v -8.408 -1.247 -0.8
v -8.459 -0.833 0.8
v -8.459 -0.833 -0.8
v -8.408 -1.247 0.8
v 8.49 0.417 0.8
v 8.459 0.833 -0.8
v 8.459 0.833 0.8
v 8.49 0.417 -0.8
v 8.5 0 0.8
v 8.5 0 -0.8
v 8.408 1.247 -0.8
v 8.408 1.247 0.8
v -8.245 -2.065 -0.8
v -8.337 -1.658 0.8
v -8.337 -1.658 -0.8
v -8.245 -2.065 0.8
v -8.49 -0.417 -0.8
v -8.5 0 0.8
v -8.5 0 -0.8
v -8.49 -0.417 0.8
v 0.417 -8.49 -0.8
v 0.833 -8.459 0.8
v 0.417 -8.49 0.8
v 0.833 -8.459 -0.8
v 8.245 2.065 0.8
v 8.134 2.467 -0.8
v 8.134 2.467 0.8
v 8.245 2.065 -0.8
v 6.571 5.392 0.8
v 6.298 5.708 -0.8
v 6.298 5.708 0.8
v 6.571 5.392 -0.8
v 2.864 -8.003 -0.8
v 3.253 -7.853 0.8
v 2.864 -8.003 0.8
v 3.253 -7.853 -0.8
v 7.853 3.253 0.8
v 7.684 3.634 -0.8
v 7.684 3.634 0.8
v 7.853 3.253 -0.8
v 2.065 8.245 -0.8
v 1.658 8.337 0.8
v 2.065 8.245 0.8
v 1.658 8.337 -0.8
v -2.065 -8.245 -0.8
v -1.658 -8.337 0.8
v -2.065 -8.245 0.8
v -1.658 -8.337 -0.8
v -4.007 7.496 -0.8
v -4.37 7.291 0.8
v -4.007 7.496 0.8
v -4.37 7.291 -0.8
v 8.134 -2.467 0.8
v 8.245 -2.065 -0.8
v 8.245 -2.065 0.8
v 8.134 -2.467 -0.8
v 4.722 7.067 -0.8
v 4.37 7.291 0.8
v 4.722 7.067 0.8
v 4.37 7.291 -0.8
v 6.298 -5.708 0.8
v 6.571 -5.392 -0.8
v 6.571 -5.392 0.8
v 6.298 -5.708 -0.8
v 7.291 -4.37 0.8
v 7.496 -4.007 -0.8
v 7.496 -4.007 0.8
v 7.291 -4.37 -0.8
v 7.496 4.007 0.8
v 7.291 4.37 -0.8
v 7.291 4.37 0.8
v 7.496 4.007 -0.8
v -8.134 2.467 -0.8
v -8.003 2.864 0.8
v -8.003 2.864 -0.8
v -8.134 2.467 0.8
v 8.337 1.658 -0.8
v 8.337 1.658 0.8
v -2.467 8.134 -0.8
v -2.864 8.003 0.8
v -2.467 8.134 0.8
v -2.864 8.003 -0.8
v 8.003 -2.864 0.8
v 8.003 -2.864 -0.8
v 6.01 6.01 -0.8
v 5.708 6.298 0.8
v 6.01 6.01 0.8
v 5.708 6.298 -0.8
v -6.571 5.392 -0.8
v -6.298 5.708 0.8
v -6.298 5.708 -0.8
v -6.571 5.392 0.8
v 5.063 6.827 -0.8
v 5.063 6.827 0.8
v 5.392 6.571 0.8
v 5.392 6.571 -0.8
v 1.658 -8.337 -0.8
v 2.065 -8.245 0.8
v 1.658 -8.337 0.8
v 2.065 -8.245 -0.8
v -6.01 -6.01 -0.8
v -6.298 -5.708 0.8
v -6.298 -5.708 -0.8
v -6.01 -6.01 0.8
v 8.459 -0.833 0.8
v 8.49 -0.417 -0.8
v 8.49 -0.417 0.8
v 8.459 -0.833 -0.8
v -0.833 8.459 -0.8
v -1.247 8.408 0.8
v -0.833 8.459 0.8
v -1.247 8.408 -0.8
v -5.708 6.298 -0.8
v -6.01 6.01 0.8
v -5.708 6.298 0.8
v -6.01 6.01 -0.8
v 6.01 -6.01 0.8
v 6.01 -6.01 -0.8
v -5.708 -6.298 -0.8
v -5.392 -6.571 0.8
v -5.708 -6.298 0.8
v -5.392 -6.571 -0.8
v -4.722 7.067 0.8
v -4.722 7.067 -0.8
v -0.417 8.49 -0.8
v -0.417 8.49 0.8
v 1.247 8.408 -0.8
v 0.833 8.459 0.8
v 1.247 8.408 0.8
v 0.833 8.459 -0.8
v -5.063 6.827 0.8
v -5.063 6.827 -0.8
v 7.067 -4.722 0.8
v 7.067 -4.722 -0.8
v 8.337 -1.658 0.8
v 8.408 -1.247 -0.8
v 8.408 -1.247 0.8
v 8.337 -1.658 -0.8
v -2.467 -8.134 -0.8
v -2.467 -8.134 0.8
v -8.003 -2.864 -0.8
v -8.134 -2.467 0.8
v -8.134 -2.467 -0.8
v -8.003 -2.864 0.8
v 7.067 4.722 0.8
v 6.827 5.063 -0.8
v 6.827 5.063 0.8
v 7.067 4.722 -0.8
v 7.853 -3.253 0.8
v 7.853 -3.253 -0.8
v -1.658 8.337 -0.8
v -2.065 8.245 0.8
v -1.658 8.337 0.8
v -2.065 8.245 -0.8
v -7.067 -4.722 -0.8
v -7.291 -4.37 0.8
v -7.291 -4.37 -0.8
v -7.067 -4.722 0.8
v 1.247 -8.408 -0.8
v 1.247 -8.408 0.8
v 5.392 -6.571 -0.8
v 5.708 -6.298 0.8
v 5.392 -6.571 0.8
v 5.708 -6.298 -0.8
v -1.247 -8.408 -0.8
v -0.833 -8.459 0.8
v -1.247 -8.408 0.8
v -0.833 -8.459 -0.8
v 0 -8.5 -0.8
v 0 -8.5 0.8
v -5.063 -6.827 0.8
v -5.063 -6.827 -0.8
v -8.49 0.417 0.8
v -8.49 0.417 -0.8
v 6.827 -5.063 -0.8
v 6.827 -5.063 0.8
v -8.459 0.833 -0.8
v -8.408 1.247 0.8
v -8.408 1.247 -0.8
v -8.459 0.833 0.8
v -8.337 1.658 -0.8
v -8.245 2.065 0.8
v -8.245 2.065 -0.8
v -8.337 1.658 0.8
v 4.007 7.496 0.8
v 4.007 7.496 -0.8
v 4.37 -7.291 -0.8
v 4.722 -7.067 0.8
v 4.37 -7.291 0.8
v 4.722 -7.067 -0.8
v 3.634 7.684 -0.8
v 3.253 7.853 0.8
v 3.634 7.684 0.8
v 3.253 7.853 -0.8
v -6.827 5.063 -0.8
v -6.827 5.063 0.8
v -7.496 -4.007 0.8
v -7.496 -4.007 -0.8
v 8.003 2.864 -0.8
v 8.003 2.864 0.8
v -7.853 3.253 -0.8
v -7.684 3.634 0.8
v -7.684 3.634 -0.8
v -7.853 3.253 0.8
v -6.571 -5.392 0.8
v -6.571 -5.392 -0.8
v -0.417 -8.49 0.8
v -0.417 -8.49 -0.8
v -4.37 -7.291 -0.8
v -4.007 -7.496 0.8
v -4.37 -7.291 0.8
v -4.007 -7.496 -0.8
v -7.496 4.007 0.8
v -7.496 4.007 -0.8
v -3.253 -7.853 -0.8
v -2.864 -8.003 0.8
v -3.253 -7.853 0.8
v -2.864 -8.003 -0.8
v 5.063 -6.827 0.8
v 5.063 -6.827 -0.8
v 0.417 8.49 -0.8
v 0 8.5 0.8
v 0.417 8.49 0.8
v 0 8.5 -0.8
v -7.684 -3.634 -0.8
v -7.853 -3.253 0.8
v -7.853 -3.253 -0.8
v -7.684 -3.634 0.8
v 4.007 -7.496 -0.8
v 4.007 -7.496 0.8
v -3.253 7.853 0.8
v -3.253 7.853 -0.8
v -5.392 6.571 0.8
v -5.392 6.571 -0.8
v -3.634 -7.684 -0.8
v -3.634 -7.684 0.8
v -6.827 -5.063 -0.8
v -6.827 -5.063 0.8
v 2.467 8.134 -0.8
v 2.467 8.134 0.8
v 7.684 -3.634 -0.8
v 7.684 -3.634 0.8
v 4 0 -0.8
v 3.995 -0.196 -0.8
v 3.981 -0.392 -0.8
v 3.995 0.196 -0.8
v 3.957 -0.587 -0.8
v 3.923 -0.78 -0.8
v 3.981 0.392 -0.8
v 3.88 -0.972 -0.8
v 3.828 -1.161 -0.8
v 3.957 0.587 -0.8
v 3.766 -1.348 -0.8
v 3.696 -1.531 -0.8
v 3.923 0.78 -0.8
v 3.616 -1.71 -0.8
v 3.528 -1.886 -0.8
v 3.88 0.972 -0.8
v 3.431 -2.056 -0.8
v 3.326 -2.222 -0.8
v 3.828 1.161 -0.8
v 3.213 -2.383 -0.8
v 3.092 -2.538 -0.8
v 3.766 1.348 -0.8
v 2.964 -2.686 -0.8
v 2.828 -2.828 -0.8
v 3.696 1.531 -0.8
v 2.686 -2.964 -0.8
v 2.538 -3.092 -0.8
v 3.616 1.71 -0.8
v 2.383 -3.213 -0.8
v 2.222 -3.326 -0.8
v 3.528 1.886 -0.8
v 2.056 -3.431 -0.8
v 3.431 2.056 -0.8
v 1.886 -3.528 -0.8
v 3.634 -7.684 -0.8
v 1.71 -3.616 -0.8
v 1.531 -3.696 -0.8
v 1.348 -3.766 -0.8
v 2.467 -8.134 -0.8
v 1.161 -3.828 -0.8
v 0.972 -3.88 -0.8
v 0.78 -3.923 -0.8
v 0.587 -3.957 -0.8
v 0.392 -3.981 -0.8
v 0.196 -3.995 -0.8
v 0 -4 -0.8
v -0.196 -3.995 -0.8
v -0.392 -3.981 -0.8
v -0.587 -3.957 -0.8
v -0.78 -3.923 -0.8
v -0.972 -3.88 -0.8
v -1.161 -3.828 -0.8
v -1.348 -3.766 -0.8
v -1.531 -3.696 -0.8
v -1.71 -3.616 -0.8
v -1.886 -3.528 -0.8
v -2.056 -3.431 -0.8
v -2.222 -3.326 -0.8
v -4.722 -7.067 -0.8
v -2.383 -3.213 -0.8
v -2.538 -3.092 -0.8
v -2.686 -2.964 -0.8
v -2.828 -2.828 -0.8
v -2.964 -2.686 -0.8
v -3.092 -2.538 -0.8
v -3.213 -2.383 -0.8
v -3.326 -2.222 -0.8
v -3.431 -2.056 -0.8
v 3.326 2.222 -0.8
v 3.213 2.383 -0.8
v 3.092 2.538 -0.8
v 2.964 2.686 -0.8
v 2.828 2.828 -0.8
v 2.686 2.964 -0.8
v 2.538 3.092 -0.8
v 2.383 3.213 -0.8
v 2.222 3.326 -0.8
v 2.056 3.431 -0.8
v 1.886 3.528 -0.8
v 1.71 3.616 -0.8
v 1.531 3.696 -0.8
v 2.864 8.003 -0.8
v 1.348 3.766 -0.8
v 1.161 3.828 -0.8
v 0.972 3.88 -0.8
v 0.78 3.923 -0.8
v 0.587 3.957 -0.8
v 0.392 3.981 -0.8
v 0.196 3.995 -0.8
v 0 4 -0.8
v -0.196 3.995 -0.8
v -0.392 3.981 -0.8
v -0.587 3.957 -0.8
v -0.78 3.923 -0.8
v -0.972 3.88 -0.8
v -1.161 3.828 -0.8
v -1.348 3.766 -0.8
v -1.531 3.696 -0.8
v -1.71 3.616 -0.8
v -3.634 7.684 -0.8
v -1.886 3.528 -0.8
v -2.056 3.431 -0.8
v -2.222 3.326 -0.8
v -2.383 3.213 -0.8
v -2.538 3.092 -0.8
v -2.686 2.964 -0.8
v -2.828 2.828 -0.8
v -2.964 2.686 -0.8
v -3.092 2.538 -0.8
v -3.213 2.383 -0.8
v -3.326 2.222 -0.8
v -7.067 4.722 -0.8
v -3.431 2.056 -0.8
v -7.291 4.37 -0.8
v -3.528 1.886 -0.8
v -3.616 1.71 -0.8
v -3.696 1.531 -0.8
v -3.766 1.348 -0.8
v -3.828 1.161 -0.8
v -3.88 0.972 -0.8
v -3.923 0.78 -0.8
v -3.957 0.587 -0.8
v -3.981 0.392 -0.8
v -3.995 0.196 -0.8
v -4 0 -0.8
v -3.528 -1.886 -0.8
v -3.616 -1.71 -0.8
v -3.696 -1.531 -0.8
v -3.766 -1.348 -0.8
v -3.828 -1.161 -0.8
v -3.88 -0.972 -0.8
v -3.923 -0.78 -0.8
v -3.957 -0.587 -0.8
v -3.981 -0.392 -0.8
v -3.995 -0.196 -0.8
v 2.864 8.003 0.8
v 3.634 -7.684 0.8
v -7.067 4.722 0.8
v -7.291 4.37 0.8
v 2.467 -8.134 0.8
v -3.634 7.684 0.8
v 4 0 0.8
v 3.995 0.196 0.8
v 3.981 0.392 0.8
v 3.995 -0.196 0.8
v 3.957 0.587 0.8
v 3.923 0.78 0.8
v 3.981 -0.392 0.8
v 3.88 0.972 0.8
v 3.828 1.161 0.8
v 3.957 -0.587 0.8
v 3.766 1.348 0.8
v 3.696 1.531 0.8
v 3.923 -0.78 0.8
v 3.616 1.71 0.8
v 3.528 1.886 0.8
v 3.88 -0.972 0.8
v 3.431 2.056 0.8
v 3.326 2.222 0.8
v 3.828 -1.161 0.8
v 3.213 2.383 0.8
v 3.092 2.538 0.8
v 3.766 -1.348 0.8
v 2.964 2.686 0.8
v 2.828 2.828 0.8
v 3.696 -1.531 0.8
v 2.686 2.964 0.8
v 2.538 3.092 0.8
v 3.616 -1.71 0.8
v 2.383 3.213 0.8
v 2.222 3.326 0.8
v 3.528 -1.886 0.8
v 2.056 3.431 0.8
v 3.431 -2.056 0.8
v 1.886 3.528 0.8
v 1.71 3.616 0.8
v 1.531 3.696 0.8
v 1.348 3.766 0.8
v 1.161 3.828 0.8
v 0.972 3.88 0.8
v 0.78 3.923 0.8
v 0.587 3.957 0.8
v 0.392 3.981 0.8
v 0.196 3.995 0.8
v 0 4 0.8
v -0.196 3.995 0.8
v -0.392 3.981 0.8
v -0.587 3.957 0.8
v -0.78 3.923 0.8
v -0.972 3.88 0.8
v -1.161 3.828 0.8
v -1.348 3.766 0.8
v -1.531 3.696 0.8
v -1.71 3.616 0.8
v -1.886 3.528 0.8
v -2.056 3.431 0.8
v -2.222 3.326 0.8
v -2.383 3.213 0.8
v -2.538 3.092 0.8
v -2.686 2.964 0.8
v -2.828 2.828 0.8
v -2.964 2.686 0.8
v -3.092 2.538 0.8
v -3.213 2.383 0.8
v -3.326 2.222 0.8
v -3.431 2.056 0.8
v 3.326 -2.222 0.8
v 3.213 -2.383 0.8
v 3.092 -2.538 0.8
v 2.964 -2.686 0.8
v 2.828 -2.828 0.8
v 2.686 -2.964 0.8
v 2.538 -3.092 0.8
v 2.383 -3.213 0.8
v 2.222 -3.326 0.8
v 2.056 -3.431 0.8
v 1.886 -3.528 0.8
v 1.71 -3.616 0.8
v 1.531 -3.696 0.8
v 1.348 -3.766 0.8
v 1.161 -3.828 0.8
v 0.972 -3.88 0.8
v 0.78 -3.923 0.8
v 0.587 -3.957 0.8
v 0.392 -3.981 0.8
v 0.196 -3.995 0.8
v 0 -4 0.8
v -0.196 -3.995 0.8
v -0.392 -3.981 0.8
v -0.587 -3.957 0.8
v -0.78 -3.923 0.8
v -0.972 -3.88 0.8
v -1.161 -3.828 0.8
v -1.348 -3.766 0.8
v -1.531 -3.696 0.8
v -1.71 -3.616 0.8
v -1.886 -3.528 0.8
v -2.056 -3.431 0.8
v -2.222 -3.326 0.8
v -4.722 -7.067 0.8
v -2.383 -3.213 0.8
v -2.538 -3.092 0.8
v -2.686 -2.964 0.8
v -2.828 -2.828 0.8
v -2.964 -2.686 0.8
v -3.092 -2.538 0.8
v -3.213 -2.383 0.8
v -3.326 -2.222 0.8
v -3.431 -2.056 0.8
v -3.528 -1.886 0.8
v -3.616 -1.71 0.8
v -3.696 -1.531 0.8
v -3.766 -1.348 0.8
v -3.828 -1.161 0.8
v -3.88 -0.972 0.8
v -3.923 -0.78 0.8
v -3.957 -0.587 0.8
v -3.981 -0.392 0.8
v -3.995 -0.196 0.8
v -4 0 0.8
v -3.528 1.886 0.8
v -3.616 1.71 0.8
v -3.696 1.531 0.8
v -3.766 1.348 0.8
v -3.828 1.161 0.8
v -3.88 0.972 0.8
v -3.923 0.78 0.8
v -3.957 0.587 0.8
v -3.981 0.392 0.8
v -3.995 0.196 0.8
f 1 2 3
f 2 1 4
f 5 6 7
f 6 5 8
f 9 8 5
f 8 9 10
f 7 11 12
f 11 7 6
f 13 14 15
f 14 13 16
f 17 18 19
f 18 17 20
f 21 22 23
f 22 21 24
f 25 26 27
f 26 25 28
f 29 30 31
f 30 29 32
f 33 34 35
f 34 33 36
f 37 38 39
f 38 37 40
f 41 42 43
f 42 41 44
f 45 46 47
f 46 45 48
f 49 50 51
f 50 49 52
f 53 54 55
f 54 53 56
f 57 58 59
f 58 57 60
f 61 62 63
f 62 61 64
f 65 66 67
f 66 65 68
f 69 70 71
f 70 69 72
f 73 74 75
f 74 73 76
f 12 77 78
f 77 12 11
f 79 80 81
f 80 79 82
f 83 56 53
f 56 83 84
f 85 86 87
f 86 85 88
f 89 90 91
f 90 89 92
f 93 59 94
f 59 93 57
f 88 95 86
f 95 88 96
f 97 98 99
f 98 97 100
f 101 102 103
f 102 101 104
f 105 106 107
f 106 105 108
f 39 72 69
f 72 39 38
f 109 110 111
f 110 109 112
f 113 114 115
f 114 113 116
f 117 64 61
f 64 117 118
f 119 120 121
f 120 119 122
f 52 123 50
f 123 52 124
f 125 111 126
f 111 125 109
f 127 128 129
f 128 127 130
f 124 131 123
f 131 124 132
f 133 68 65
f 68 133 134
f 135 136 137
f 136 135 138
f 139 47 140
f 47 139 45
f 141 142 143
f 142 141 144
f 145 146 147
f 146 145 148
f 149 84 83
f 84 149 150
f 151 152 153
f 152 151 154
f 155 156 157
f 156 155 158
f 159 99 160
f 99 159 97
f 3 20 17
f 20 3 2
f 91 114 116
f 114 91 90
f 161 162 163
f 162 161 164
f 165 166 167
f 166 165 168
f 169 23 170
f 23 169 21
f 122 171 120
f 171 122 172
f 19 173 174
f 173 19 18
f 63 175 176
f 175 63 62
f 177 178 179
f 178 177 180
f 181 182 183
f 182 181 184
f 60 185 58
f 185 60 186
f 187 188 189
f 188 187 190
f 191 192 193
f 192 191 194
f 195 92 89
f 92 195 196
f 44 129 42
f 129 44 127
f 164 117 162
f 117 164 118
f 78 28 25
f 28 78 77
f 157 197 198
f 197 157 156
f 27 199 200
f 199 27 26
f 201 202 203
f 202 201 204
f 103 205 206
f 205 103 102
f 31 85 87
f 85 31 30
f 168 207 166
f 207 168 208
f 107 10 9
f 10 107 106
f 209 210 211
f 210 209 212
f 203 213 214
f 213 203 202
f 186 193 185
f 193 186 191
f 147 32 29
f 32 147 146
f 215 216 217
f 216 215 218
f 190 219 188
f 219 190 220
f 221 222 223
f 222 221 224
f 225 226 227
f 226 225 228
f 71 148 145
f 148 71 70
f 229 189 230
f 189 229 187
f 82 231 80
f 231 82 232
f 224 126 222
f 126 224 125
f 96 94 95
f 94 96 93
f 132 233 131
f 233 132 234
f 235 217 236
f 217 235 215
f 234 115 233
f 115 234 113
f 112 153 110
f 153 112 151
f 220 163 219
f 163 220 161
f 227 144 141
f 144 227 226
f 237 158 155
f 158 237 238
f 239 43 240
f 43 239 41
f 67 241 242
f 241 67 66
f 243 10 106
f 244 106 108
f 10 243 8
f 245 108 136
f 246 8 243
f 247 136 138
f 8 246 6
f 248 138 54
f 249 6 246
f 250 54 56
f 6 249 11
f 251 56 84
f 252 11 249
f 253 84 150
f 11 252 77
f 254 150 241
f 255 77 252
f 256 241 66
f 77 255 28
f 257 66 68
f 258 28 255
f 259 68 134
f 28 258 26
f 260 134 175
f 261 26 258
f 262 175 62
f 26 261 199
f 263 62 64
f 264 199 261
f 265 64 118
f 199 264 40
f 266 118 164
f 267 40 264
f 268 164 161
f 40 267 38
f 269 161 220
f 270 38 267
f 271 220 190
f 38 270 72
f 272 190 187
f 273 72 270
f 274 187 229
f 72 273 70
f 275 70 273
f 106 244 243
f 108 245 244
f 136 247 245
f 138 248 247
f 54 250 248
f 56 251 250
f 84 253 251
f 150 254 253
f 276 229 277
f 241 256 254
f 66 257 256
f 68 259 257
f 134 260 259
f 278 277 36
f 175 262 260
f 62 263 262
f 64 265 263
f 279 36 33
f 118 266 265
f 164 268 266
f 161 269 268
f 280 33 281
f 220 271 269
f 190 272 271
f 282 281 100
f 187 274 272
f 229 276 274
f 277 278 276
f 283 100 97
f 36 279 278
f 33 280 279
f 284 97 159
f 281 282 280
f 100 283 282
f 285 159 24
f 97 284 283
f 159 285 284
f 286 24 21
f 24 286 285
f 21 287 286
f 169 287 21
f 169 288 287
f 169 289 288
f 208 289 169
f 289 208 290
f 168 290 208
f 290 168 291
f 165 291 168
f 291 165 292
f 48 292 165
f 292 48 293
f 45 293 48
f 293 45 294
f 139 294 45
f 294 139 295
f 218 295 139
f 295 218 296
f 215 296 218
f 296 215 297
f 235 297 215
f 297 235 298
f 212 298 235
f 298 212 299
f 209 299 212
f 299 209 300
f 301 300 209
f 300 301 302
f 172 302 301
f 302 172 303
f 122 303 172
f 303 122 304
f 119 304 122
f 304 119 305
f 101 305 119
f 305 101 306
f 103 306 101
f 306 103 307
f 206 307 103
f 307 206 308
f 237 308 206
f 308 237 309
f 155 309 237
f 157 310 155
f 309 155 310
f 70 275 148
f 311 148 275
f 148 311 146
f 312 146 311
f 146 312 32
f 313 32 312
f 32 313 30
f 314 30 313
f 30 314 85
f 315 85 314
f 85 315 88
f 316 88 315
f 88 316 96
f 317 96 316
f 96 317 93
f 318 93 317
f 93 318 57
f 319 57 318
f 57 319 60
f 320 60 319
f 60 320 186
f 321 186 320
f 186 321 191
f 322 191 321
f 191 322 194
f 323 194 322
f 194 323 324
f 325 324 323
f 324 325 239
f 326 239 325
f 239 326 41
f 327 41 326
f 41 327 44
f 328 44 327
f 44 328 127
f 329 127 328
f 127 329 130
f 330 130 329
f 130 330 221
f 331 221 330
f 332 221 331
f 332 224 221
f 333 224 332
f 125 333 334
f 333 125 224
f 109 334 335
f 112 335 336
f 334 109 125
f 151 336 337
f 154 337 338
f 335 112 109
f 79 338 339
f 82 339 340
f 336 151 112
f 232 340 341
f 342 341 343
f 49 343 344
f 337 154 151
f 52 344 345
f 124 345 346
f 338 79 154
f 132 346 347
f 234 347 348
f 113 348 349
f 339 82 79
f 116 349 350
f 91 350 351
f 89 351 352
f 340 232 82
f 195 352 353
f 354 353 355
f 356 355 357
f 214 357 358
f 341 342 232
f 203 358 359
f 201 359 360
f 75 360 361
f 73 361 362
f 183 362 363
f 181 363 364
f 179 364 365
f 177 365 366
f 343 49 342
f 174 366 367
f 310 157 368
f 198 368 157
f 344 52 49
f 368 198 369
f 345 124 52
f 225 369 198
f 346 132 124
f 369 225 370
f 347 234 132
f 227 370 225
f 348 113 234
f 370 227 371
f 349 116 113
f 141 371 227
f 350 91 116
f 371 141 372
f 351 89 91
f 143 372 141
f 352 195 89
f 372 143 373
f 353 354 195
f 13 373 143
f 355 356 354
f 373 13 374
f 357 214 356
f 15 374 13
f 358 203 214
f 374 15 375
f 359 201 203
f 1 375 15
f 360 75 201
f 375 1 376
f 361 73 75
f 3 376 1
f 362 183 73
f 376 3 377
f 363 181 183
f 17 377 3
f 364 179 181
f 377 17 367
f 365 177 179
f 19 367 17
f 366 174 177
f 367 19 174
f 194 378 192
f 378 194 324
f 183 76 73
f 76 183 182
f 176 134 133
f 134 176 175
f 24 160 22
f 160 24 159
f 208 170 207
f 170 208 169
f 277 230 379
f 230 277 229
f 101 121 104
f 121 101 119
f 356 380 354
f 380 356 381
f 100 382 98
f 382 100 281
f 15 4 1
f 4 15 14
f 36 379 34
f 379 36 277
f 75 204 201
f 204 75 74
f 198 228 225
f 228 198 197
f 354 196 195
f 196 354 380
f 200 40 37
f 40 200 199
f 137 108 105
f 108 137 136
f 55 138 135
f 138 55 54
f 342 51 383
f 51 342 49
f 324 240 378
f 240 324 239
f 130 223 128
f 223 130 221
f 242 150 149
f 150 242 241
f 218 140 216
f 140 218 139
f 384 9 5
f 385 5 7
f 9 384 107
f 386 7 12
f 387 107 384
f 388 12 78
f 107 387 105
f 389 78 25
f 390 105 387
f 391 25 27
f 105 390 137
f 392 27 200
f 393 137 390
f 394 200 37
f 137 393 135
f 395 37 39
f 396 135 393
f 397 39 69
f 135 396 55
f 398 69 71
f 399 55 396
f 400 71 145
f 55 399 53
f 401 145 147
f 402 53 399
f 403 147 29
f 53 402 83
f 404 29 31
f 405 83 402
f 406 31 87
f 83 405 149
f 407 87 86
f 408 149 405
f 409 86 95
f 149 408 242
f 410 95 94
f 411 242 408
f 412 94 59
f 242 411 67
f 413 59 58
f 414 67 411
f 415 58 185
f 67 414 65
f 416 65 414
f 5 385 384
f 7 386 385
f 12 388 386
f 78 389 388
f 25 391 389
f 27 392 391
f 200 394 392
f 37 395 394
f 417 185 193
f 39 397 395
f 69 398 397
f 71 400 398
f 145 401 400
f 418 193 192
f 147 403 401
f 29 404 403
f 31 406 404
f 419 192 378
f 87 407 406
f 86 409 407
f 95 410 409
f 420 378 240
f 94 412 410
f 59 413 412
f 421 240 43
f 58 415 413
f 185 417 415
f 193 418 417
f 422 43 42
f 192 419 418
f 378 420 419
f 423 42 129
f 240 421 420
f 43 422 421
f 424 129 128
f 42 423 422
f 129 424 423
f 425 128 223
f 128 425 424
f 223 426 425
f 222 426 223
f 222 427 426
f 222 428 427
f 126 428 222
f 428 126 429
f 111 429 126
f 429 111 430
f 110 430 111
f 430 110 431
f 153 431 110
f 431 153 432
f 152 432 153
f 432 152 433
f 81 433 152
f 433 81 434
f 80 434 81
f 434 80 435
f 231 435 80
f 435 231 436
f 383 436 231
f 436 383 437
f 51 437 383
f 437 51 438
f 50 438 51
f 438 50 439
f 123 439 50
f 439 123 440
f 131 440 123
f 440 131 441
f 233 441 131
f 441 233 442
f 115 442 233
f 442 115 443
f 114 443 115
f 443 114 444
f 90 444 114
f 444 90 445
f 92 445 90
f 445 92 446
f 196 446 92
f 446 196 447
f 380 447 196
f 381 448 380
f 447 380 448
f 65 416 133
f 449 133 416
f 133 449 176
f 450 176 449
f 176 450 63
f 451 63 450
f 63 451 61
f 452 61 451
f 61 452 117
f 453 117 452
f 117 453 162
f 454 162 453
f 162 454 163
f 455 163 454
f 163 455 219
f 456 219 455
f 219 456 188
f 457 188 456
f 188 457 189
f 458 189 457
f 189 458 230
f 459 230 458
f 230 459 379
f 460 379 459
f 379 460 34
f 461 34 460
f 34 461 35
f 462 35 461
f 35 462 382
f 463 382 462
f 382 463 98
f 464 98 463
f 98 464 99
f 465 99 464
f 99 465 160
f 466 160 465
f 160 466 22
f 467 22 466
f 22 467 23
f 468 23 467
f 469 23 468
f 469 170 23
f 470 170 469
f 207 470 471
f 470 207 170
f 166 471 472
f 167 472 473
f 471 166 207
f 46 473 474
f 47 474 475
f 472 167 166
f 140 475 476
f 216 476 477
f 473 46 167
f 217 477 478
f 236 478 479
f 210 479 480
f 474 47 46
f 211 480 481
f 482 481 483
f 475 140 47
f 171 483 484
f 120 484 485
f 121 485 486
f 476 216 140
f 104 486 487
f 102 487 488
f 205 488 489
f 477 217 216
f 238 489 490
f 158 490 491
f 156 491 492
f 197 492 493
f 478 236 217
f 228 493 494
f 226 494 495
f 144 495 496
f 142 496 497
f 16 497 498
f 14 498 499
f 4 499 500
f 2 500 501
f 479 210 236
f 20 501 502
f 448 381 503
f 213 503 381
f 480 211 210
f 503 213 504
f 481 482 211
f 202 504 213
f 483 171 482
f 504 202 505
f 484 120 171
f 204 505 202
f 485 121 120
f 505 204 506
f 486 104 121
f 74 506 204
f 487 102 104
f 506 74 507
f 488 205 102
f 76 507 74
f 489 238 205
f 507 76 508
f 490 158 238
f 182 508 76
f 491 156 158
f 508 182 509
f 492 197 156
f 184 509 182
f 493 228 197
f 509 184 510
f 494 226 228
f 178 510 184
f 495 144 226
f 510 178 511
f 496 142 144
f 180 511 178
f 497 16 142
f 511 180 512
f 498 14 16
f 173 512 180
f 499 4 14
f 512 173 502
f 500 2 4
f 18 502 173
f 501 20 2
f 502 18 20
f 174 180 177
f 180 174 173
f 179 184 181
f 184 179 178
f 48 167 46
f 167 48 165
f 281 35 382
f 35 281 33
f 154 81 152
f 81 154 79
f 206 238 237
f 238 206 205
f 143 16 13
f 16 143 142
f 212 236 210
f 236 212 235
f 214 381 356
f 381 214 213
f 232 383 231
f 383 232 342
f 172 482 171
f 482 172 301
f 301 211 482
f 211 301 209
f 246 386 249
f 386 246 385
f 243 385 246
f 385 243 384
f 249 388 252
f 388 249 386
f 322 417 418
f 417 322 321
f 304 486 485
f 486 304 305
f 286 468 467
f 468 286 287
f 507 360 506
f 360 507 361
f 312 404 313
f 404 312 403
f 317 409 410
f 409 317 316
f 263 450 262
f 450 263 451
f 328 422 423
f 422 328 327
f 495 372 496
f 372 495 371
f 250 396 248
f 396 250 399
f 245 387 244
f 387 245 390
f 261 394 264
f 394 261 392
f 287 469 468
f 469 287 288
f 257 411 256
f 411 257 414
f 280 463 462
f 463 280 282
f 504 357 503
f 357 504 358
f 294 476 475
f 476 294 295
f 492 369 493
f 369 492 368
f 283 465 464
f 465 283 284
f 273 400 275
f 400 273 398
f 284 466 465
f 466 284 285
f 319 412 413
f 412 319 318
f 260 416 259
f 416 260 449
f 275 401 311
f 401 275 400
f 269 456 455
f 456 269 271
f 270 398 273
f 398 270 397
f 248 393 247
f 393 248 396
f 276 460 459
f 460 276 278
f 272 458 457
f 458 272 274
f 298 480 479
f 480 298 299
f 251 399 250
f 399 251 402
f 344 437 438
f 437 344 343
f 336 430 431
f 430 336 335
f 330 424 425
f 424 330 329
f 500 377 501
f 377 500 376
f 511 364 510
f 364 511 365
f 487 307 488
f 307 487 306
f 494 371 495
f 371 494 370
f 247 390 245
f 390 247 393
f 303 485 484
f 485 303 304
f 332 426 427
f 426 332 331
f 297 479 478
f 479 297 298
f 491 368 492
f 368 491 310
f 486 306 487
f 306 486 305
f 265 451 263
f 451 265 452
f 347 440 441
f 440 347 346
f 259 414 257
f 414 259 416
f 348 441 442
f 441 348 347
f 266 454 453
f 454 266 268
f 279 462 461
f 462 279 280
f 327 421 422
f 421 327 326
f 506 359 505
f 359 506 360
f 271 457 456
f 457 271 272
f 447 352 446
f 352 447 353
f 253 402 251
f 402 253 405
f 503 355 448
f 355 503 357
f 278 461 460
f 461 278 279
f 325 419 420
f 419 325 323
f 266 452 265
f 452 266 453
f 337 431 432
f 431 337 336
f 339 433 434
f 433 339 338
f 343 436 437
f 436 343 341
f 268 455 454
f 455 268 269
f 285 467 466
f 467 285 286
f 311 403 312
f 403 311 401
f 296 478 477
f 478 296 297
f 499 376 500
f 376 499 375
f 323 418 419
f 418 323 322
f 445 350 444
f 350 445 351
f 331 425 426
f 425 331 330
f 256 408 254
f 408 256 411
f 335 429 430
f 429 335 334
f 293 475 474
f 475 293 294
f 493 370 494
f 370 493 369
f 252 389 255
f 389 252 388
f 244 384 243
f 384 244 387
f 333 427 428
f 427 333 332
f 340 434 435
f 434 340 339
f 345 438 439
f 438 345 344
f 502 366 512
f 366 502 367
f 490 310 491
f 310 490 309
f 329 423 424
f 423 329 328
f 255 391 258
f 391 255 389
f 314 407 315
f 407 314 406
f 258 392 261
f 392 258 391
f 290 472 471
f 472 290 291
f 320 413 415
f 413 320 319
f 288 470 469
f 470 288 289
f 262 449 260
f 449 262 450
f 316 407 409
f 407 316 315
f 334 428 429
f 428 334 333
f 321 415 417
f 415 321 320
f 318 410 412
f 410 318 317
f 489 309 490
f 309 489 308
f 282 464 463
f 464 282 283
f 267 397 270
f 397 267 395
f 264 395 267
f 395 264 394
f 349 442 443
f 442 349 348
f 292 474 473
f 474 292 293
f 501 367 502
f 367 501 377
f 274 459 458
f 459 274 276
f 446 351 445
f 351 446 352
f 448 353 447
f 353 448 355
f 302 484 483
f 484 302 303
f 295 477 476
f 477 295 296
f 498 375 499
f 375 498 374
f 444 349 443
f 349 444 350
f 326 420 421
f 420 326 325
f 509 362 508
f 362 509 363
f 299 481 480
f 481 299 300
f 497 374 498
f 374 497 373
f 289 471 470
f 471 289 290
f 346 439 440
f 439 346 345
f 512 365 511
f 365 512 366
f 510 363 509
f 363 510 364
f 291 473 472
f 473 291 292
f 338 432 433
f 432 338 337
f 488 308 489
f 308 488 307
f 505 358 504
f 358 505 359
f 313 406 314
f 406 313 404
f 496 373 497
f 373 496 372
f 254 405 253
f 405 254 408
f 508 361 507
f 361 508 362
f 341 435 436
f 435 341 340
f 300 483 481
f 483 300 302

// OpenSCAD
// Flat washer: 8.0mm ID, 17.0mm OD, 1.6mm thickness

inner_diameter = 8.0;   //[4:16:0.1]
outer_diameter = 17.0;  //[8.5:34:0.1]
thickness      = 1.6;   //[0.8:3.2:0.1]
eps            = 0.2;   //[0.05:0.5:0.05]

$fn = 128;

module washer(id=inner_diameter, od=outer_diameter, h=thickness) {
    difference() {
        cylinder(d=od, h=h, center=true);
        cylinder(d=id, h=h + 2*eps, center=true);
    }
}

washer();
